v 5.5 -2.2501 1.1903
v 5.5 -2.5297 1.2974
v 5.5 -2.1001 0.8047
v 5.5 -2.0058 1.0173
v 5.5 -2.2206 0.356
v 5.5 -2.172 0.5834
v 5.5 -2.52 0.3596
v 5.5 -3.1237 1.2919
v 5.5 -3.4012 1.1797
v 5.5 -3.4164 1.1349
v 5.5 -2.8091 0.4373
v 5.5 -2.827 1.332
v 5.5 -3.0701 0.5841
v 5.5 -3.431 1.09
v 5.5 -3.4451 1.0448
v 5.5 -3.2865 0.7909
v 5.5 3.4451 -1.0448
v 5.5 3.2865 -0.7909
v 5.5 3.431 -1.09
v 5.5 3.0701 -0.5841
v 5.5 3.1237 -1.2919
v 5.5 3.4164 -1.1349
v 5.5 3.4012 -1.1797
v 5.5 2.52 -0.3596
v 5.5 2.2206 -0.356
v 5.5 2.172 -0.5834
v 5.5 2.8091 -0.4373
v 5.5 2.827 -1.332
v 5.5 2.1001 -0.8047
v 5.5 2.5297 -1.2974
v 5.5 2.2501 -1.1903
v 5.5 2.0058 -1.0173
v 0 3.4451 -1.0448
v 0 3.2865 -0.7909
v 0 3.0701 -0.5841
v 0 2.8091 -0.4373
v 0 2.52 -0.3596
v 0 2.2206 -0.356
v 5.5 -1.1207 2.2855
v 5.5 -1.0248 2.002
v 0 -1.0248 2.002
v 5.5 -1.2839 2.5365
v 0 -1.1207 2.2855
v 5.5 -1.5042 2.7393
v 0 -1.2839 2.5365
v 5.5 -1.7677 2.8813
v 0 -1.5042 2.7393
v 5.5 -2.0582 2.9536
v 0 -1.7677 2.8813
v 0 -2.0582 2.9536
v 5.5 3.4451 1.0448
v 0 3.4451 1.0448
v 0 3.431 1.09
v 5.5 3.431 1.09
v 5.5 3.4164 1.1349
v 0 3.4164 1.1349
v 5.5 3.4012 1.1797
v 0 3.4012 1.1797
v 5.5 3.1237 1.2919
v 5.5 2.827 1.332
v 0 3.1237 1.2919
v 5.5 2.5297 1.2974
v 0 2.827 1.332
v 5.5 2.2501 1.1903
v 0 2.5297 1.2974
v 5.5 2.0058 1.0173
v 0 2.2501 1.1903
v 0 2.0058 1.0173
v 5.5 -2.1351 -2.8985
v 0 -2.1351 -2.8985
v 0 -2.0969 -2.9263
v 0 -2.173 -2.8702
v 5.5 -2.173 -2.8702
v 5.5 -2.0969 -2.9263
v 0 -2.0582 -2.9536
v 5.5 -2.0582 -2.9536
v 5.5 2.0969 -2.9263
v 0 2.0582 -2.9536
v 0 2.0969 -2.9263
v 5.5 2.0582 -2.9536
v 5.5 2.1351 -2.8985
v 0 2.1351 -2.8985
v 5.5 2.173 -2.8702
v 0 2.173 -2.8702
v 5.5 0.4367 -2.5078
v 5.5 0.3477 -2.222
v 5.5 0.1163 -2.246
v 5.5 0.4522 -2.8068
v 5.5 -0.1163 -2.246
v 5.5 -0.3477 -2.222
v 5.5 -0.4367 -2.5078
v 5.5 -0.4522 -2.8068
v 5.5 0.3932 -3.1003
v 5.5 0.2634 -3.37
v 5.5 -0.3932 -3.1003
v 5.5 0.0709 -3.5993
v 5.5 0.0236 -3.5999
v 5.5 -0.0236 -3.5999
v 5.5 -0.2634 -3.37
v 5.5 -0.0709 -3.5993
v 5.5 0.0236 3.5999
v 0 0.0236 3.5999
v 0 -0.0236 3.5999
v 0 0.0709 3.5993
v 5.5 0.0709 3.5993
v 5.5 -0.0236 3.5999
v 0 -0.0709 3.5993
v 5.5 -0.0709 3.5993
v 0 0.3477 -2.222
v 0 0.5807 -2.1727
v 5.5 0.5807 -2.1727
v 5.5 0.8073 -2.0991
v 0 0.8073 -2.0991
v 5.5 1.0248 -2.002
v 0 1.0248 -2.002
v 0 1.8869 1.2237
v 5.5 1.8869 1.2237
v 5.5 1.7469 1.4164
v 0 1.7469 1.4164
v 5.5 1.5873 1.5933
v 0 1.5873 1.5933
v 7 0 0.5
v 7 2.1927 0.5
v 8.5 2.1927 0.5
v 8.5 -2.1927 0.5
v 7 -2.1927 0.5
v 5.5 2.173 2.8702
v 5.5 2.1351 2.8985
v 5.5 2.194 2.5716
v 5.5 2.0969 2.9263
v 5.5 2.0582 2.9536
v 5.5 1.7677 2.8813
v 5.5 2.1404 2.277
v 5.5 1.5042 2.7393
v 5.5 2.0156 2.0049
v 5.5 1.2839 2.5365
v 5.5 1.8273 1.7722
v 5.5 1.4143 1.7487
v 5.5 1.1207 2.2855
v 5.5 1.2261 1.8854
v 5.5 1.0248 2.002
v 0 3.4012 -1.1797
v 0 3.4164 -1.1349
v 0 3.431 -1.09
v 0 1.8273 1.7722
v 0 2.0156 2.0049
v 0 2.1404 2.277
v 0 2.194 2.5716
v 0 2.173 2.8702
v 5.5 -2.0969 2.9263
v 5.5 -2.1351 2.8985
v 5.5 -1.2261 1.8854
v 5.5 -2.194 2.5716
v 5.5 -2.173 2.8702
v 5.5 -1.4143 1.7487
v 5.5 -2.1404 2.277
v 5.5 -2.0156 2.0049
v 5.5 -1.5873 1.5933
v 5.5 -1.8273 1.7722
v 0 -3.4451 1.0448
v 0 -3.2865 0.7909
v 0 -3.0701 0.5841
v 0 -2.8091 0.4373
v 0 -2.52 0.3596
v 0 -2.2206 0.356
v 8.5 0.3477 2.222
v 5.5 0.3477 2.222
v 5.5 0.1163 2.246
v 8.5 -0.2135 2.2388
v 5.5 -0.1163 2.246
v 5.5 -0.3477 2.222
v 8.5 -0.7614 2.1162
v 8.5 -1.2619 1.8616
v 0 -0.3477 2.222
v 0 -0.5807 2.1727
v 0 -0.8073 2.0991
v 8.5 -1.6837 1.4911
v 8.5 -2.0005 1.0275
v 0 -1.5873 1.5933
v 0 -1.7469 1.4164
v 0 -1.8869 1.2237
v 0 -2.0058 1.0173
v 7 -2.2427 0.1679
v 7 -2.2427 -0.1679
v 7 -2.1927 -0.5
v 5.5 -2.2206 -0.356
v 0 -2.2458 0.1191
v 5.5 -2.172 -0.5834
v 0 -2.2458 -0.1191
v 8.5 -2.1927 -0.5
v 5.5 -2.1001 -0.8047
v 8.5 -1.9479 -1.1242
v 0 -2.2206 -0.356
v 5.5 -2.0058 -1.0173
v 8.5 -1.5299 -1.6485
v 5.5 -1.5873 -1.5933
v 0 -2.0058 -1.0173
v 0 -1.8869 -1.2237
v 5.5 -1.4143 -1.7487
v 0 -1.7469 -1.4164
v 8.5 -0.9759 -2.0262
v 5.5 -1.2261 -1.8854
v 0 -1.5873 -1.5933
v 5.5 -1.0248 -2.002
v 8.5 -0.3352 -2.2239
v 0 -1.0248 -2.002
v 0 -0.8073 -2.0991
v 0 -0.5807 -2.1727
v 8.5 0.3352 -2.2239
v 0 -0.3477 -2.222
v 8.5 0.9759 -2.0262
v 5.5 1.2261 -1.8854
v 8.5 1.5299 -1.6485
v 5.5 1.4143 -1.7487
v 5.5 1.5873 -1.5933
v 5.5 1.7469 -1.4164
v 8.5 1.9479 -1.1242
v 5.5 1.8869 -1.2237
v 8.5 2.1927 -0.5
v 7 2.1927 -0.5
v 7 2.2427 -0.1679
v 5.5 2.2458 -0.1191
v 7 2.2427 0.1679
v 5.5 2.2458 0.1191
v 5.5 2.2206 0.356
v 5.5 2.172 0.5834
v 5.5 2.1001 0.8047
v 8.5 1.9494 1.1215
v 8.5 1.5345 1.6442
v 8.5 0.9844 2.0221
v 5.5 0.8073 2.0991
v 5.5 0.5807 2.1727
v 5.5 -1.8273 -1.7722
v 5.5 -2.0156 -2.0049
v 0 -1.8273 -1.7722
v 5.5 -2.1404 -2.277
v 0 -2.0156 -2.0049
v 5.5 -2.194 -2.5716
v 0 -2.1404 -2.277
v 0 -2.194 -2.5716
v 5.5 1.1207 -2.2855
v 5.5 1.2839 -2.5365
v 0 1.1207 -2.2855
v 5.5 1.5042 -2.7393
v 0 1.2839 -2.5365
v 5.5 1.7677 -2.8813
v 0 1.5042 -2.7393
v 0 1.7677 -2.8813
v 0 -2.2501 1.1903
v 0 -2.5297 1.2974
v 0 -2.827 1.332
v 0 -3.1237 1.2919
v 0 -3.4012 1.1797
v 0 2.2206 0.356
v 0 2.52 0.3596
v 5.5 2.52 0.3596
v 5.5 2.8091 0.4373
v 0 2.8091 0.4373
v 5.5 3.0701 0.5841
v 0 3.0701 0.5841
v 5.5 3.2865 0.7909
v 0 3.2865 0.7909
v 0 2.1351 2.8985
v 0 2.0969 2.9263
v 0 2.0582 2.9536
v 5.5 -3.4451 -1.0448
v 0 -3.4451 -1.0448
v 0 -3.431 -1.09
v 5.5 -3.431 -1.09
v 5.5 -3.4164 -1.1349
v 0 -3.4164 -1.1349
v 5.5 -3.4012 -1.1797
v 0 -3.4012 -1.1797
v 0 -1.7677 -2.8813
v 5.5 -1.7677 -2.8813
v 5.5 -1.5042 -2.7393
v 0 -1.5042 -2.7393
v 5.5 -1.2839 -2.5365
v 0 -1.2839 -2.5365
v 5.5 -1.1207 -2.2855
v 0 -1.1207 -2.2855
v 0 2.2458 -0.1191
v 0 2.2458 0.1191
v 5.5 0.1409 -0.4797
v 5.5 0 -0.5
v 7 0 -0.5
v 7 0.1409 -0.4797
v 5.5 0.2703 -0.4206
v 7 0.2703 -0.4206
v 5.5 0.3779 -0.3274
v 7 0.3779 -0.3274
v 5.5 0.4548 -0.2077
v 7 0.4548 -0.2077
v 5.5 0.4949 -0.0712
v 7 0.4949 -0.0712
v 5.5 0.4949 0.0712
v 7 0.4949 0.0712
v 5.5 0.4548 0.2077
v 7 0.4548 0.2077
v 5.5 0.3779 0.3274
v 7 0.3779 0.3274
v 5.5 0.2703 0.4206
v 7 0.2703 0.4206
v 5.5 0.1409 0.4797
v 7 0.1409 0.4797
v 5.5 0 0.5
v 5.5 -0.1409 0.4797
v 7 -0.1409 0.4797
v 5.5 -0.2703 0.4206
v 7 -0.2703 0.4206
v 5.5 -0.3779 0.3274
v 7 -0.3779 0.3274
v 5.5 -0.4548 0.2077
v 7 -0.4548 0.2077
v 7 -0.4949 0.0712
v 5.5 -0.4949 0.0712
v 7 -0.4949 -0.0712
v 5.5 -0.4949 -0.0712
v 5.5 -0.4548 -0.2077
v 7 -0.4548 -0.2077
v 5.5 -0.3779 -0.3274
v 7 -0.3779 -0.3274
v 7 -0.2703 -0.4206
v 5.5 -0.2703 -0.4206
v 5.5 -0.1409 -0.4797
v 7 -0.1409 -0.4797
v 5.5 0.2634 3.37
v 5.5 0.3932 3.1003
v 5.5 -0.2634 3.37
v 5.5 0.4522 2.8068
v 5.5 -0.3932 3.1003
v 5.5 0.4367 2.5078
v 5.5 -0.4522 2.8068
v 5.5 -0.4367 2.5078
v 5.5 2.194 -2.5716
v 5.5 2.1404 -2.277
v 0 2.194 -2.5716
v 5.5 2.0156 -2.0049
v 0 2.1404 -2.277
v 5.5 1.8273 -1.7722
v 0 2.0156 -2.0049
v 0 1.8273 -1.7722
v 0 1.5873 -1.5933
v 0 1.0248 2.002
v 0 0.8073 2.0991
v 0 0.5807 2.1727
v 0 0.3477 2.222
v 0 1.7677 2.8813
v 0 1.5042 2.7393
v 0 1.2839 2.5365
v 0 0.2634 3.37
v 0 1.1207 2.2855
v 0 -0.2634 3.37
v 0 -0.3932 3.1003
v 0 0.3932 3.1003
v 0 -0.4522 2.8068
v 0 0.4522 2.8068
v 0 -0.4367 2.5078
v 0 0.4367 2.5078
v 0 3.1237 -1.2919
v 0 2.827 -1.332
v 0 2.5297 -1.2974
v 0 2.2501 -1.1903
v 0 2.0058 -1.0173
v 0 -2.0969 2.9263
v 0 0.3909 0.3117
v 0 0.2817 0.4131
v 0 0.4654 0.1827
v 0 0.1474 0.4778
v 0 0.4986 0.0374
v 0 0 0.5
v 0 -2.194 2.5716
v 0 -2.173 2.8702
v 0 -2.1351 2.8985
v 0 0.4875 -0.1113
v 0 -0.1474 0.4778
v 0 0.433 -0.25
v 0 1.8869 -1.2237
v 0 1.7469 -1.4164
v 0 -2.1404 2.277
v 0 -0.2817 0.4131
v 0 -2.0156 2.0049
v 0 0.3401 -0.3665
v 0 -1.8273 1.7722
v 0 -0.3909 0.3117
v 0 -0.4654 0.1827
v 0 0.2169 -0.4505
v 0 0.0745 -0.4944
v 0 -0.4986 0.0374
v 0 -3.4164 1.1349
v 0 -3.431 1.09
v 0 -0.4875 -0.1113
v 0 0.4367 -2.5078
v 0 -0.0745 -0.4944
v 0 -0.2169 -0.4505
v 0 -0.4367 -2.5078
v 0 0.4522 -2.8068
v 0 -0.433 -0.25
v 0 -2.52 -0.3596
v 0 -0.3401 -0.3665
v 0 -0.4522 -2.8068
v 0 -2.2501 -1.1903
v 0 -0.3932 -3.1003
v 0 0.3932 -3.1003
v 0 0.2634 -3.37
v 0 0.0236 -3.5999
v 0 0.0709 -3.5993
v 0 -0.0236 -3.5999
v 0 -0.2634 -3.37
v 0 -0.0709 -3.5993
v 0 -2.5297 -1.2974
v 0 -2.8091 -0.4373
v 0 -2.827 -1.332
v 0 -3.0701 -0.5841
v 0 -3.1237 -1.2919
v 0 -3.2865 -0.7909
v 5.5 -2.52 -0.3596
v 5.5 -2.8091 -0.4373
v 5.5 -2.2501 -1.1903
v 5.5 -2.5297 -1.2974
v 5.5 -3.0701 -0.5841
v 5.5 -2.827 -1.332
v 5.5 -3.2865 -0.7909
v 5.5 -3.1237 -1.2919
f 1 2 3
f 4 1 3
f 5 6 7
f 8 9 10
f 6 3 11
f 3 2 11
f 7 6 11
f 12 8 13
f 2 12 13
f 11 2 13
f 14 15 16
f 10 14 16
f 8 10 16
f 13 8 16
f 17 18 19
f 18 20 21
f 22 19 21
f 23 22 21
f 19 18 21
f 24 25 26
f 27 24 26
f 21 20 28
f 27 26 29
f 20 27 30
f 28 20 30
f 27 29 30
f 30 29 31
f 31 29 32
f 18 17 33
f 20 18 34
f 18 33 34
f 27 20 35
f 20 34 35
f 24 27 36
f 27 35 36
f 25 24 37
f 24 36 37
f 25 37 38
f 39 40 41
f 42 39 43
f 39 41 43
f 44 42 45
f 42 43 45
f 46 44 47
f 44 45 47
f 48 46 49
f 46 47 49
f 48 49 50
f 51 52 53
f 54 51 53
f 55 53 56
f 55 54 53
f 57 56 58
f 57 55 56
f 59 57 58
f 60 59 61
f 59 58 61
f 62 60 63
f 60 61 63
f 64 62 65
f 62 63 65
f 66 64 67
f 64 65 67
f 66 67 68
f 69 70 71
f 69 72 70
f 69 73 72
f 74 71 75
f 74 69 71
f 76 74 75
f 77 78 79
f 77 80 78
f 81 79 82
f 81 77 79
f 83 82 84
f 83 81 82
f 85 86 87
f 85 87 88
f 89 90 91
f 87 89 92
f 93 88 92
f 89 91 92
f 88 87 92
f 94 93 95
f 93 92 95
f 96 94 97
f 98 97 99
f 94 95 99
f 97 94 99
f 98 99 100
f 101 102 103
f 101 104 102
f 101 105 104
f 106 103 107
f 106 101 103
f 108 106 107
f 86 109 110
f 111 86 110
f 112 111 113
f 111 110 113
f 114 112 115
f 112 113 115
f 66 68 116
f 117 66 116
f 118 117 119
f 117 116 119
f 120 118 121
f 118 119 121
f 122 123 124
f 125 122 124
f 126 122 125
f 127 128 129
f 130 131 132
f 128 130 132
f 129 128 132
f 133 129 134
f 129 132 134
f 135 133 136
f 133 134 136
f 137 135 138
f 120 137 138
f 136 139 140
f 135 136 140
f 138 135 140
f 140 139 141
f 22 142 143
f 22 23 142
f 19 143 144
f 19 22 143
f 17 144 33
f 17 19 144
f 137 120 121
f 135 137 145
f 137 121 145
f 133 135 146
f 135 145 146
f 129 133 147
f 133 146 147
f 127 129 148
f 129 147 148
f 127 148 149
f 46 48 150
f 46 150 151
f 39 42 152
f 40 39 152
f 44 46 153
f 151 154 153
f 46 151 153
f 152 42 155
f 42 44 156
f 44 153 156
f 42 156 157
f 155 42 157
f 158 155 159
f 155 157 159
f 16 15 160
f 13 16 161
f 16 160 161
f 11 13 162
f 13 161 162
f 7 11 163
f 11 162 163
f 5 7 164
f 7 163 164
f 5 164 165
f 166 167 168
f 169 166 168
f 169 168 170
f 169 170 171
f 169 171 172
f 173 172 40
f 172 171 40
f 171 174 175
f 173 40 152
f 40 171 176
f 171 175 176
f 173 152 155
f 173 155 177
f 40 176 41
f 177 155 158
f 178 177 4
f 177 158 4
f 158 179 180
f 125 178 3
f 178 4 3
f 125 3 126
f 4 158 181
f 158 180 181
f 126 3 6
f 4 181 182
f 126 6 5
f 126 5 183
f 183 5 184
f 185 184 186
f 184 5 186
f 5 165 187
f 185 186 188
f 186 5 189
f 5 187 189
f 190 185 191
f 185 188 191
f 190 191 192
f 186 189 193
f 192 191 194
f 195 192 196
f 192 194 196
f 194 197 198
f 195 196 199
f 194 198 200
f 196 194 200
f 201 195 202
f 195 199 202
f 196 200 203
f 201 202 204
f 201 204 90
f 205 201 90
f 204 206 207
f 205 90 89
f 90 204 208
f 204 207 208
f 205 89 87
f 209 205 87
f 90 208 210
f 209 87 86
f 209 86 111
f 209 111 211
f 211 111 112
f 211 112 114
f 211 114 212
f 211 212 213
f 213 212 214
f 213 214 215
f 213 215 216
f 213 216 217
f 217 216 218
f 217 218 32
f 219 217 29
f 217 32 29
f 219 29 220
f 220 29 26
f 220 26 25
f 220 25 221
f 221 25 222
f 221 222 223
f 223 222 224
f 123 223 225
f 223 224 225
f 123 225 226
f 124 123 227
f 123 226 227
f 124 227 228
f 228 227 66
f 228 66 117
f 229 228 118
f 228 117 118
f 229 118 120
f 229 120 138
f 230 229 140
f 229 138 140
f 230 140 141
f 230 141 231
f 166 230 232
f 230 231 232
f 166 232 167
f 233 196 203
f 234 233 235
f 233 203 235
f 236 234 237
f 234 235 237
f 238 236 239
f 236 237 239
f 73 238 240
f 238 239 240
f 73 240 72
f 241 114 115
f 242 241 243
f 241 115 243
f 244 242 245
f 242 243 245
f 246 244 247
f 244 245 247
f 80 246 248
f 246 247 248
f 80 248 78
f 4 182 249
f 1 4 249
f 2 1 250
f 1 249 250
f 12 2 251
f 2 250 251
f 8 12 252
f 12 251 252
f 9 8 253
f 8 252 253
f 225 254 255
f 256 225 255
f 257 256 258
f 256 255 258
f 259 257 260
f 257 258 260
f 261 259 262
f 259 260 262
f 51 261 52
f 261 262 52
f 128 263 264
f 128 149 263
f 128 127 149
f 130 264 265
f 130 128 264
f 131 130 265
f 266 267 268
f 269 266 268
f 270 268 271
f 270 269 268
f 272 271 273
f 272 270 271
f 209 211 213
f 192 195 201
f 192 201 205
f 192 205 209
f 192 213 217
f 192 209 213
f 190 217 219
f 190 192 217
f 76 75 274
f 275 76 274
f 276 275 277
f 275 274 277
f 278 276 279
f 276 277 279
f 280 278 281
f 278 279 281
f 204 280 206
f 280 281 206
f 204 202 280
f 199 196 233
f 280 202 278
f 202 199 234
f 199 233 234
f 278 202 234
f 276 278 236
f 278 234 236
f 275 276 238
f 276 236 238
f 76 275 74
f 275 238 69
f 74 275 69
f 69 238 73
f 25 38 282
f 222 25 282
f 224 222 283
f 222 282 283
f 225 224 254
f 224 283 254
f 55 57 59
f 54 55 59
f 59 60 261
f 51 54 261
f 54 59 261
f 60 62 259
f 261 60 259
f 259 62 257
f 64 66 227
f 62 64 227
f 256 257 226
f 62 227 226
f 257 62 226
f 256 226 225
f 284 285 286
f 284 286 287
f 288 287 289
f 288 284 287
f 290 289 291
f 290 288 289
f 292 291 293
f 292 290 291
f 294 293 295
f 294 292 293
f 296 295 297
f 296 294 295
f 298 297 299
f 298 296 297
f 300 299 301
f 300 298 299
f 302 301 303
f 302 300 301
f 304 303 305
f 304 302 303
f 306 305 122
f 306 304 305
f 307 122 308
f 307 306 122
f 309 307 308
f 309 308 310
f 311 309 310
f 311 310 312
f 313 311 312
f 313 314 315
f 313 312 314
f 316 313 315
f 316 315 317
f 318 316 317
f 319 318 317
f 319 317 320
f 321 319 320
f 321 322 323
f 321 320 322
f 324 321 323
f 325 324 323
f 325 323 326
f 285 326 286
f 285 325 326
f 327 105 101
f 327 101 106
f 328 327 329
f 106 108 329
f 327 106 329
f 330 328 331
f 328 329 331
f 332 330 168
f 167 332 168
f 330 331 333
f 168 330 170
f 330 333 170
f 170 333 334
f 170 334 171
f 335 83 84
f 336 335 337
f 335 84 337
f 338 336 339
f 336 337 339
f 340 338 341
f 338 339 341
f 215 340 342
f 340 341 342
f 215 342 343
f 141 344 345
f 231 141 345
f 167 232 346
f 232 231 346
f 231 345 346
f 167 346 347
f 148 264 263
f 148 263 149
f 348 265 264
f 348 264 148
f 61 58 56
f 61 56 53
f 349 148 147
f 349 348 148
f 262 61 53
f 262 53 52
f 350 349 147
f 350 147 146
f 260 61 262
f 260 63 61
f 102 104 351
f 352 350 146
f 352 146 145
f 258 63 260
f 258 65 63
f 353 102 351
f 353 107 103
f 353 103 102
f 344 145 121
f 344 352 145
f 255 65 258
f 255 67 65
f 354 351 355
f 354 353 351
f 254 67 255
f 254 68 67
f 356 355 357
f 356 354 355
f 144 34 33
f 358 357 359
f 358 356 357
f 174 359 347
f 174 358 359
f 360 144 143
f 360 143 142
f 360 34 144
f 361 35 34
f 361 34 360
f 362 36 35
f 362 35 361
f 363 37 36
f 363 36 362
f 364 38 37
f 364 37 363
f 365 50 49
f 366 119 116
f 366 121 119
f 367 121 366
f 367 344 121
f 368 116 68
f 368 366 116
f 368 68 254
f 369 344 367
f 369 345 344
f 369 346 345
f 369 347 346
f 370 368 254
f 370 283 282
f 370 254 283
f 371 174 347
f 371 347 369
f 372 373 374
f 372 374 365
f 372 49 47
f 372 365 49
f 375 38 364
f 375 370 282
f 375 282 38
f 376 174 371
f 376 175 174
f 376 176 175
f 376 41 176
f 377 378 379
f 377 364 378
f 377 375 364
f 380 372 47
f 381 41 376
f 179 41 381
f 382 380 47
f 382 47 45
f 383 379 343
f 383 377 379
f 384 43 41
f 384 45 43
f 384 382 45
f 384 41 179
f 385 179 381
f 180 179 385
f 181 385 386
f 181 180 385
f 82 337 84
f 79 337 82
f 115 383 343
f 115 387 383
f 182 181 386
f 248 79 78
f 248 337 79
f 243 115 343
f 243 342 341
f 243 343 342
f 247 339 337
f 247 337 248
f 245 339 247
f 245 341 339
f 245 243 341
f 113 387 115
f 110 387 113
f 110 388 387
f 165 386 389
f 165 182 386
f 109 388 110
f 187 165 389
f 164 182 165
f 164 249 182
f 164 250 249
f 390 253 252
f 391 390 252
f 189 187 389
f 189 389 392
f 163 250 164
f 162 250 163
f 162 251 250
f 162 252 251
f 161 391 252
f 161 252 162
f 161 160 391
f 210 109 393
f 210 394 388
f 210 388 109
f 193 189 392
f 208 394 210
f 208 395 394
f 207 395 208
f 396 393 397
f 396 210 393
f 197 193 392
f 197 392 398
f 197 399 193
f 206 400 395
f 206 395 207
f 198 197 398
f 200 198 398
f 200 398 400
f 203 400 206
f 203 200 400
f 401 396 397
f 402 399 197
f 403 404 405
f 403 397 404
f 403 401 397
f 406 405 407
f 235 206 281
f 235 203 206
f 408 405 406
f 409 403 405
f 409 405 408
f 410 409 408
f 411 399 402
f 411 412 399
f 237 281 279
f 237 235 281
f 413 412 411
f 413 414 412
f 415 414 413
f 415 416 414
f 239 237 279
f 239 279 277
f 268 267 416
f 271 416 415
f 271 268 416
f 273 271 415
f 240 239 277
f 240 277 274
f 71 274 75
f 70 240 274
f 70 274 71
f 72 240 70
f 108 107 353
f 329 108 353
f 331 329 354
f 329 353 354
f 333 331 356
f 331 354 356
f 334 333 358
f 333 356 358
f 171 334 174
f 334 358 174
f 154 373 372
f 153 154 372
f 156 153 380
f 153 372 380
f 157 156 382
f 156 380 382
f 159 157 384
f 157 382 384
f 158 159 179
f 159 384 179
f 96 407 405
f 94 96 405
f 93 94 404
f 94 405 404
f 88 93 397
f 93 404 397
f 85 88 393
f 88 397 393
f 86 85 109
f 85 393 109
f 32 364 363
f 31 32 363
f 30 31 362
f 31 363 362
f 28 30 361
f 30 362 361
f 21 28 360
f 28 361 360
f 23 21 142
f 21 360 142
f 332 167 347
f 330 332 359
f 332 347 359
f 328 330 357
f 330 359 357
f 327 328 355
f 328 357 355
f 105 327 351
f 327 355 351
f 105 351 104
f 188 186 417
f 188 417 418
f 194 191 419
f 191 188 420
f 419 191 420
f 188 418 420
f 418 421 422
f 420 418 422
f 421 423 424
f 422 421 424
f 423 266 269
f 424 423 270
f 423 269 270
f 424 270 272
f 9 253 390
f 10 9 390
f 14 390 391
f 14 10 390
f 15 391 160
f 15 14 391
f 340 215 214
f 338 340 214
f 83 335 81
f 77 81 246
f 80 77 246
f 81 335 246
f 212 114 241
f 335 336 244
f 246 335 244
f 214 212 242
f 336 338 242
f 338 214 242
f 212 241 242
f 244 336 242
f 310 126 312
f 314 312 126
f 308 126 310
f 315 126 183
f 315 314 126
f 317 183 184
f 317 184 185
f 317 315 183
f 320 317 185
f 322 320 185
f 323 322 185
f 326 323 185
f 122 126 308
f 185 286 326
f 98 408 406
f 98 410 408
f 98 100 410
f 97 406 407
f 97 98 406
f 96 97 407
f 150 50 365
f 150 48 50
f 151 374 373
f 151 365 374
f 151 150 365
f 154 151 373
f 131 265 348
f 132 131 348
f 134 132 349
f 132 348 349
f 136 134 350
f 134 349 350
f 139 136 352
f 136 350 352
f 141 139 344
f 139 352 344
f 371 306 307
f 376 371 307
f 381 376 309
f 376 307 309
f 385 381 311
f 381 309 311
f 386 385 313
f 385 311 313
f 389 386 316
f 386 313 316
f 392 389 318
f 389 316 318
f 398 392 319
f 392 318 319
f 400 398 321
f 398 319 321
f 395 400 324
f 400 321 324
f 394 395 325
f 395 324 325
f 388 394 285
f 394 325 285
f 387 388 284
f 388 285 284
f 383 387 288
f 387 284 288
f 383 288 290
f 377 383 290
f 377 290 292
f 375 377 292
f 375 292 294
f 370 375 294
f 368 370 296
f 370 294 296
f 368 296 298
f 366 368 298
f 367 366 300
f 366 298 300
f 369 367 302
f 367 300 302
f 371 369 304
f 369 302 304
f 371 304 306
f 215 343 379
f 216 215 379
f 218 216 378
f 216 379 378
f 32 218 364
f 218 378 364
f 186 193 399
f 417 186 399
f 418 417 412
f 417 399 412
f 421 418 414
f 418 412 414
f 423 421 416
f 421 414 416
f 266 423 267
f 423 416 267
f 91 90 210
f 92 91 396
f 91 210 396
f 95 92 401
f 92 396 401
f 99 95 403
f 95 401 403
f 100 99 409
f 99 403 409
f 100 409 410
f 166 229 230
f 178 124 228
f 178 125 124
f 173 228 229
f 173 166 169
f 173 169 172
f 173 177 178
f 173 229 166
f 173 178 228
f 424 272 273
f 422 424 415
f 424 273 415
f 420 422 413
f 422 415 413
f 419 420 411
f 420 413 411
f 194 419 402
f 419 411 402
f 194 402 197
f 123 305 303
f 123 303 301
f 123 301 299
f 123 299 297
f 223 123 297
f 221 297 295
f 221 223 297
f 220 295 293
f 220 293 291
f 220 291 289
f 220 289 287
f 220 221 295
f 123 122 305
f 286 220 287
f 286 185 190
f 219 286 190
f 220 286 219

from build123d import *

# Parameters (mm, degrees)
BASPROSKE_W         = 5.5
BASPROSKE_H         = 3.6
TOOTHCUT_DEPTH      = 8.494664769
TEETHCUTS_COUNT     = 10
TEETHCUTS_ANGLE     = 324
BORSKE_R            = 0.5
BORE_DEPTH          = 50.0000508
SKETCH_1_R          = 2.249
SKETCH_1_R_2        = 0.5
EXTRUDE_1_DEPTH     = 3
CUT_EXTRUDE_START   = -1.5
CUT_EXTRUDE_1_DEPTH = 1.5


with BuildPart() as part:
    # BasProSke → Base-Revolve (revolve)
    with BuildSketch(Plane(origin=(0, 0, 0), x_dir=(1, 0, 0), z_dir=(0, 1, 0))):
        with Locations((2.75, 1.8)):
            Rectangle(BASPROSKE_W, BASPROSKE_H)
    revolve(axis=Axis((-10, 0, 0), (1, 0, 0)))

    # TooCutSke → ToothCut (cut, through all)
    with BuildSketch(Plane(origin=(0, 0, 0), x_dir=(0, 0, -1), z_dir=(1, 0, 0))):
        with BuildLine():
            ThreePointArc((0.355978269, 2.22064866), (0, 2.249), (-0.355978269, 2.22064866))
            ThreePointArc((-0.355978269, 2.22064866), (-0.512117582, 2.960985626), (-1.080212515, 3.460732015))
            ThreePointArc((-1.080212515, 3.460732015), (0, 3.6254), (1.080212515, 3.460732015))
            ThreePointArc((1.080212515, 3.460732015), (0.512117582, 2.960985626), (0.355978269, 2.22064866))
        make_face()
    toothcut = extrude(amount=TOOTHCUT_DEPTH, mode=Mode.SUBTRACT)

    # TeethCuts: ToothCut ×10 about axis
    teethcuts_axis = Axis((-10, 0, 0), (1, 0, 0))
    for i in range(1, TEETHCUTS_COUNT):
        add(toothcut.rotate(teethcuts_axis, i * TEETHCUTS_ANGLE / (TEETHCUTS_COUNT - 1)), mode=Mode.SUBTRACT)

    # BorSke → Bore (cut, symmetric)
    with BuildSketch(Plane(origin=(0, 0, 0), x_dir=(0, 0, -1), z_dir=(1, 0, 0))):
        Circle(BORSKE_R)
    extrude(amount=BORE_DEPTH, both=True, mode=Mode.SUBTRACT)

    # 草图1 → 凸台-拉伸1 (add)
    with BuildSketch(Plane(origin=(5.5, 0, 0), x_dir=(0, 0, -1), z_dir=(1, 0, 0))):
        Circle(SKETCH_1_R)
        Circle(SKETCH_1_R_2, mode=Mode.SUBTRACT)
    extrude(amount=EXTRUDE_1_DEPTH)

    # 草图2 → 切除-拉伸1 (cut)
    with BuildSketch(Plane(origin=(8.5, 0, 0), x_dir=(0, 0, -1), z_dir=(1, 0, 0)).offset(CUT_EXTRUDE_START)):
        with BuildLine():
            Line((-0.5, 0), (-0.5, -2.19271544))
            ThreePointArc((-0.5, -2.19271544), (0, -2.249), (0.5, -2.19271544))
            Line((0.5, -2.19271544), (0.5, 0))
            Line((0.5, 0), (0.5, 2.19271544))
            ThreePointArc((0.5, 2.19271544), (0, 2.249), (-0.5, 2.19271544))
            Line((-0.5, 2.19271544), (-0.5, 0))
        make_face()
    extrude(amount=CUT_EXTRUDE_1_DEPTH, mode=Mode.SUBTRACT)


solid = part.part
